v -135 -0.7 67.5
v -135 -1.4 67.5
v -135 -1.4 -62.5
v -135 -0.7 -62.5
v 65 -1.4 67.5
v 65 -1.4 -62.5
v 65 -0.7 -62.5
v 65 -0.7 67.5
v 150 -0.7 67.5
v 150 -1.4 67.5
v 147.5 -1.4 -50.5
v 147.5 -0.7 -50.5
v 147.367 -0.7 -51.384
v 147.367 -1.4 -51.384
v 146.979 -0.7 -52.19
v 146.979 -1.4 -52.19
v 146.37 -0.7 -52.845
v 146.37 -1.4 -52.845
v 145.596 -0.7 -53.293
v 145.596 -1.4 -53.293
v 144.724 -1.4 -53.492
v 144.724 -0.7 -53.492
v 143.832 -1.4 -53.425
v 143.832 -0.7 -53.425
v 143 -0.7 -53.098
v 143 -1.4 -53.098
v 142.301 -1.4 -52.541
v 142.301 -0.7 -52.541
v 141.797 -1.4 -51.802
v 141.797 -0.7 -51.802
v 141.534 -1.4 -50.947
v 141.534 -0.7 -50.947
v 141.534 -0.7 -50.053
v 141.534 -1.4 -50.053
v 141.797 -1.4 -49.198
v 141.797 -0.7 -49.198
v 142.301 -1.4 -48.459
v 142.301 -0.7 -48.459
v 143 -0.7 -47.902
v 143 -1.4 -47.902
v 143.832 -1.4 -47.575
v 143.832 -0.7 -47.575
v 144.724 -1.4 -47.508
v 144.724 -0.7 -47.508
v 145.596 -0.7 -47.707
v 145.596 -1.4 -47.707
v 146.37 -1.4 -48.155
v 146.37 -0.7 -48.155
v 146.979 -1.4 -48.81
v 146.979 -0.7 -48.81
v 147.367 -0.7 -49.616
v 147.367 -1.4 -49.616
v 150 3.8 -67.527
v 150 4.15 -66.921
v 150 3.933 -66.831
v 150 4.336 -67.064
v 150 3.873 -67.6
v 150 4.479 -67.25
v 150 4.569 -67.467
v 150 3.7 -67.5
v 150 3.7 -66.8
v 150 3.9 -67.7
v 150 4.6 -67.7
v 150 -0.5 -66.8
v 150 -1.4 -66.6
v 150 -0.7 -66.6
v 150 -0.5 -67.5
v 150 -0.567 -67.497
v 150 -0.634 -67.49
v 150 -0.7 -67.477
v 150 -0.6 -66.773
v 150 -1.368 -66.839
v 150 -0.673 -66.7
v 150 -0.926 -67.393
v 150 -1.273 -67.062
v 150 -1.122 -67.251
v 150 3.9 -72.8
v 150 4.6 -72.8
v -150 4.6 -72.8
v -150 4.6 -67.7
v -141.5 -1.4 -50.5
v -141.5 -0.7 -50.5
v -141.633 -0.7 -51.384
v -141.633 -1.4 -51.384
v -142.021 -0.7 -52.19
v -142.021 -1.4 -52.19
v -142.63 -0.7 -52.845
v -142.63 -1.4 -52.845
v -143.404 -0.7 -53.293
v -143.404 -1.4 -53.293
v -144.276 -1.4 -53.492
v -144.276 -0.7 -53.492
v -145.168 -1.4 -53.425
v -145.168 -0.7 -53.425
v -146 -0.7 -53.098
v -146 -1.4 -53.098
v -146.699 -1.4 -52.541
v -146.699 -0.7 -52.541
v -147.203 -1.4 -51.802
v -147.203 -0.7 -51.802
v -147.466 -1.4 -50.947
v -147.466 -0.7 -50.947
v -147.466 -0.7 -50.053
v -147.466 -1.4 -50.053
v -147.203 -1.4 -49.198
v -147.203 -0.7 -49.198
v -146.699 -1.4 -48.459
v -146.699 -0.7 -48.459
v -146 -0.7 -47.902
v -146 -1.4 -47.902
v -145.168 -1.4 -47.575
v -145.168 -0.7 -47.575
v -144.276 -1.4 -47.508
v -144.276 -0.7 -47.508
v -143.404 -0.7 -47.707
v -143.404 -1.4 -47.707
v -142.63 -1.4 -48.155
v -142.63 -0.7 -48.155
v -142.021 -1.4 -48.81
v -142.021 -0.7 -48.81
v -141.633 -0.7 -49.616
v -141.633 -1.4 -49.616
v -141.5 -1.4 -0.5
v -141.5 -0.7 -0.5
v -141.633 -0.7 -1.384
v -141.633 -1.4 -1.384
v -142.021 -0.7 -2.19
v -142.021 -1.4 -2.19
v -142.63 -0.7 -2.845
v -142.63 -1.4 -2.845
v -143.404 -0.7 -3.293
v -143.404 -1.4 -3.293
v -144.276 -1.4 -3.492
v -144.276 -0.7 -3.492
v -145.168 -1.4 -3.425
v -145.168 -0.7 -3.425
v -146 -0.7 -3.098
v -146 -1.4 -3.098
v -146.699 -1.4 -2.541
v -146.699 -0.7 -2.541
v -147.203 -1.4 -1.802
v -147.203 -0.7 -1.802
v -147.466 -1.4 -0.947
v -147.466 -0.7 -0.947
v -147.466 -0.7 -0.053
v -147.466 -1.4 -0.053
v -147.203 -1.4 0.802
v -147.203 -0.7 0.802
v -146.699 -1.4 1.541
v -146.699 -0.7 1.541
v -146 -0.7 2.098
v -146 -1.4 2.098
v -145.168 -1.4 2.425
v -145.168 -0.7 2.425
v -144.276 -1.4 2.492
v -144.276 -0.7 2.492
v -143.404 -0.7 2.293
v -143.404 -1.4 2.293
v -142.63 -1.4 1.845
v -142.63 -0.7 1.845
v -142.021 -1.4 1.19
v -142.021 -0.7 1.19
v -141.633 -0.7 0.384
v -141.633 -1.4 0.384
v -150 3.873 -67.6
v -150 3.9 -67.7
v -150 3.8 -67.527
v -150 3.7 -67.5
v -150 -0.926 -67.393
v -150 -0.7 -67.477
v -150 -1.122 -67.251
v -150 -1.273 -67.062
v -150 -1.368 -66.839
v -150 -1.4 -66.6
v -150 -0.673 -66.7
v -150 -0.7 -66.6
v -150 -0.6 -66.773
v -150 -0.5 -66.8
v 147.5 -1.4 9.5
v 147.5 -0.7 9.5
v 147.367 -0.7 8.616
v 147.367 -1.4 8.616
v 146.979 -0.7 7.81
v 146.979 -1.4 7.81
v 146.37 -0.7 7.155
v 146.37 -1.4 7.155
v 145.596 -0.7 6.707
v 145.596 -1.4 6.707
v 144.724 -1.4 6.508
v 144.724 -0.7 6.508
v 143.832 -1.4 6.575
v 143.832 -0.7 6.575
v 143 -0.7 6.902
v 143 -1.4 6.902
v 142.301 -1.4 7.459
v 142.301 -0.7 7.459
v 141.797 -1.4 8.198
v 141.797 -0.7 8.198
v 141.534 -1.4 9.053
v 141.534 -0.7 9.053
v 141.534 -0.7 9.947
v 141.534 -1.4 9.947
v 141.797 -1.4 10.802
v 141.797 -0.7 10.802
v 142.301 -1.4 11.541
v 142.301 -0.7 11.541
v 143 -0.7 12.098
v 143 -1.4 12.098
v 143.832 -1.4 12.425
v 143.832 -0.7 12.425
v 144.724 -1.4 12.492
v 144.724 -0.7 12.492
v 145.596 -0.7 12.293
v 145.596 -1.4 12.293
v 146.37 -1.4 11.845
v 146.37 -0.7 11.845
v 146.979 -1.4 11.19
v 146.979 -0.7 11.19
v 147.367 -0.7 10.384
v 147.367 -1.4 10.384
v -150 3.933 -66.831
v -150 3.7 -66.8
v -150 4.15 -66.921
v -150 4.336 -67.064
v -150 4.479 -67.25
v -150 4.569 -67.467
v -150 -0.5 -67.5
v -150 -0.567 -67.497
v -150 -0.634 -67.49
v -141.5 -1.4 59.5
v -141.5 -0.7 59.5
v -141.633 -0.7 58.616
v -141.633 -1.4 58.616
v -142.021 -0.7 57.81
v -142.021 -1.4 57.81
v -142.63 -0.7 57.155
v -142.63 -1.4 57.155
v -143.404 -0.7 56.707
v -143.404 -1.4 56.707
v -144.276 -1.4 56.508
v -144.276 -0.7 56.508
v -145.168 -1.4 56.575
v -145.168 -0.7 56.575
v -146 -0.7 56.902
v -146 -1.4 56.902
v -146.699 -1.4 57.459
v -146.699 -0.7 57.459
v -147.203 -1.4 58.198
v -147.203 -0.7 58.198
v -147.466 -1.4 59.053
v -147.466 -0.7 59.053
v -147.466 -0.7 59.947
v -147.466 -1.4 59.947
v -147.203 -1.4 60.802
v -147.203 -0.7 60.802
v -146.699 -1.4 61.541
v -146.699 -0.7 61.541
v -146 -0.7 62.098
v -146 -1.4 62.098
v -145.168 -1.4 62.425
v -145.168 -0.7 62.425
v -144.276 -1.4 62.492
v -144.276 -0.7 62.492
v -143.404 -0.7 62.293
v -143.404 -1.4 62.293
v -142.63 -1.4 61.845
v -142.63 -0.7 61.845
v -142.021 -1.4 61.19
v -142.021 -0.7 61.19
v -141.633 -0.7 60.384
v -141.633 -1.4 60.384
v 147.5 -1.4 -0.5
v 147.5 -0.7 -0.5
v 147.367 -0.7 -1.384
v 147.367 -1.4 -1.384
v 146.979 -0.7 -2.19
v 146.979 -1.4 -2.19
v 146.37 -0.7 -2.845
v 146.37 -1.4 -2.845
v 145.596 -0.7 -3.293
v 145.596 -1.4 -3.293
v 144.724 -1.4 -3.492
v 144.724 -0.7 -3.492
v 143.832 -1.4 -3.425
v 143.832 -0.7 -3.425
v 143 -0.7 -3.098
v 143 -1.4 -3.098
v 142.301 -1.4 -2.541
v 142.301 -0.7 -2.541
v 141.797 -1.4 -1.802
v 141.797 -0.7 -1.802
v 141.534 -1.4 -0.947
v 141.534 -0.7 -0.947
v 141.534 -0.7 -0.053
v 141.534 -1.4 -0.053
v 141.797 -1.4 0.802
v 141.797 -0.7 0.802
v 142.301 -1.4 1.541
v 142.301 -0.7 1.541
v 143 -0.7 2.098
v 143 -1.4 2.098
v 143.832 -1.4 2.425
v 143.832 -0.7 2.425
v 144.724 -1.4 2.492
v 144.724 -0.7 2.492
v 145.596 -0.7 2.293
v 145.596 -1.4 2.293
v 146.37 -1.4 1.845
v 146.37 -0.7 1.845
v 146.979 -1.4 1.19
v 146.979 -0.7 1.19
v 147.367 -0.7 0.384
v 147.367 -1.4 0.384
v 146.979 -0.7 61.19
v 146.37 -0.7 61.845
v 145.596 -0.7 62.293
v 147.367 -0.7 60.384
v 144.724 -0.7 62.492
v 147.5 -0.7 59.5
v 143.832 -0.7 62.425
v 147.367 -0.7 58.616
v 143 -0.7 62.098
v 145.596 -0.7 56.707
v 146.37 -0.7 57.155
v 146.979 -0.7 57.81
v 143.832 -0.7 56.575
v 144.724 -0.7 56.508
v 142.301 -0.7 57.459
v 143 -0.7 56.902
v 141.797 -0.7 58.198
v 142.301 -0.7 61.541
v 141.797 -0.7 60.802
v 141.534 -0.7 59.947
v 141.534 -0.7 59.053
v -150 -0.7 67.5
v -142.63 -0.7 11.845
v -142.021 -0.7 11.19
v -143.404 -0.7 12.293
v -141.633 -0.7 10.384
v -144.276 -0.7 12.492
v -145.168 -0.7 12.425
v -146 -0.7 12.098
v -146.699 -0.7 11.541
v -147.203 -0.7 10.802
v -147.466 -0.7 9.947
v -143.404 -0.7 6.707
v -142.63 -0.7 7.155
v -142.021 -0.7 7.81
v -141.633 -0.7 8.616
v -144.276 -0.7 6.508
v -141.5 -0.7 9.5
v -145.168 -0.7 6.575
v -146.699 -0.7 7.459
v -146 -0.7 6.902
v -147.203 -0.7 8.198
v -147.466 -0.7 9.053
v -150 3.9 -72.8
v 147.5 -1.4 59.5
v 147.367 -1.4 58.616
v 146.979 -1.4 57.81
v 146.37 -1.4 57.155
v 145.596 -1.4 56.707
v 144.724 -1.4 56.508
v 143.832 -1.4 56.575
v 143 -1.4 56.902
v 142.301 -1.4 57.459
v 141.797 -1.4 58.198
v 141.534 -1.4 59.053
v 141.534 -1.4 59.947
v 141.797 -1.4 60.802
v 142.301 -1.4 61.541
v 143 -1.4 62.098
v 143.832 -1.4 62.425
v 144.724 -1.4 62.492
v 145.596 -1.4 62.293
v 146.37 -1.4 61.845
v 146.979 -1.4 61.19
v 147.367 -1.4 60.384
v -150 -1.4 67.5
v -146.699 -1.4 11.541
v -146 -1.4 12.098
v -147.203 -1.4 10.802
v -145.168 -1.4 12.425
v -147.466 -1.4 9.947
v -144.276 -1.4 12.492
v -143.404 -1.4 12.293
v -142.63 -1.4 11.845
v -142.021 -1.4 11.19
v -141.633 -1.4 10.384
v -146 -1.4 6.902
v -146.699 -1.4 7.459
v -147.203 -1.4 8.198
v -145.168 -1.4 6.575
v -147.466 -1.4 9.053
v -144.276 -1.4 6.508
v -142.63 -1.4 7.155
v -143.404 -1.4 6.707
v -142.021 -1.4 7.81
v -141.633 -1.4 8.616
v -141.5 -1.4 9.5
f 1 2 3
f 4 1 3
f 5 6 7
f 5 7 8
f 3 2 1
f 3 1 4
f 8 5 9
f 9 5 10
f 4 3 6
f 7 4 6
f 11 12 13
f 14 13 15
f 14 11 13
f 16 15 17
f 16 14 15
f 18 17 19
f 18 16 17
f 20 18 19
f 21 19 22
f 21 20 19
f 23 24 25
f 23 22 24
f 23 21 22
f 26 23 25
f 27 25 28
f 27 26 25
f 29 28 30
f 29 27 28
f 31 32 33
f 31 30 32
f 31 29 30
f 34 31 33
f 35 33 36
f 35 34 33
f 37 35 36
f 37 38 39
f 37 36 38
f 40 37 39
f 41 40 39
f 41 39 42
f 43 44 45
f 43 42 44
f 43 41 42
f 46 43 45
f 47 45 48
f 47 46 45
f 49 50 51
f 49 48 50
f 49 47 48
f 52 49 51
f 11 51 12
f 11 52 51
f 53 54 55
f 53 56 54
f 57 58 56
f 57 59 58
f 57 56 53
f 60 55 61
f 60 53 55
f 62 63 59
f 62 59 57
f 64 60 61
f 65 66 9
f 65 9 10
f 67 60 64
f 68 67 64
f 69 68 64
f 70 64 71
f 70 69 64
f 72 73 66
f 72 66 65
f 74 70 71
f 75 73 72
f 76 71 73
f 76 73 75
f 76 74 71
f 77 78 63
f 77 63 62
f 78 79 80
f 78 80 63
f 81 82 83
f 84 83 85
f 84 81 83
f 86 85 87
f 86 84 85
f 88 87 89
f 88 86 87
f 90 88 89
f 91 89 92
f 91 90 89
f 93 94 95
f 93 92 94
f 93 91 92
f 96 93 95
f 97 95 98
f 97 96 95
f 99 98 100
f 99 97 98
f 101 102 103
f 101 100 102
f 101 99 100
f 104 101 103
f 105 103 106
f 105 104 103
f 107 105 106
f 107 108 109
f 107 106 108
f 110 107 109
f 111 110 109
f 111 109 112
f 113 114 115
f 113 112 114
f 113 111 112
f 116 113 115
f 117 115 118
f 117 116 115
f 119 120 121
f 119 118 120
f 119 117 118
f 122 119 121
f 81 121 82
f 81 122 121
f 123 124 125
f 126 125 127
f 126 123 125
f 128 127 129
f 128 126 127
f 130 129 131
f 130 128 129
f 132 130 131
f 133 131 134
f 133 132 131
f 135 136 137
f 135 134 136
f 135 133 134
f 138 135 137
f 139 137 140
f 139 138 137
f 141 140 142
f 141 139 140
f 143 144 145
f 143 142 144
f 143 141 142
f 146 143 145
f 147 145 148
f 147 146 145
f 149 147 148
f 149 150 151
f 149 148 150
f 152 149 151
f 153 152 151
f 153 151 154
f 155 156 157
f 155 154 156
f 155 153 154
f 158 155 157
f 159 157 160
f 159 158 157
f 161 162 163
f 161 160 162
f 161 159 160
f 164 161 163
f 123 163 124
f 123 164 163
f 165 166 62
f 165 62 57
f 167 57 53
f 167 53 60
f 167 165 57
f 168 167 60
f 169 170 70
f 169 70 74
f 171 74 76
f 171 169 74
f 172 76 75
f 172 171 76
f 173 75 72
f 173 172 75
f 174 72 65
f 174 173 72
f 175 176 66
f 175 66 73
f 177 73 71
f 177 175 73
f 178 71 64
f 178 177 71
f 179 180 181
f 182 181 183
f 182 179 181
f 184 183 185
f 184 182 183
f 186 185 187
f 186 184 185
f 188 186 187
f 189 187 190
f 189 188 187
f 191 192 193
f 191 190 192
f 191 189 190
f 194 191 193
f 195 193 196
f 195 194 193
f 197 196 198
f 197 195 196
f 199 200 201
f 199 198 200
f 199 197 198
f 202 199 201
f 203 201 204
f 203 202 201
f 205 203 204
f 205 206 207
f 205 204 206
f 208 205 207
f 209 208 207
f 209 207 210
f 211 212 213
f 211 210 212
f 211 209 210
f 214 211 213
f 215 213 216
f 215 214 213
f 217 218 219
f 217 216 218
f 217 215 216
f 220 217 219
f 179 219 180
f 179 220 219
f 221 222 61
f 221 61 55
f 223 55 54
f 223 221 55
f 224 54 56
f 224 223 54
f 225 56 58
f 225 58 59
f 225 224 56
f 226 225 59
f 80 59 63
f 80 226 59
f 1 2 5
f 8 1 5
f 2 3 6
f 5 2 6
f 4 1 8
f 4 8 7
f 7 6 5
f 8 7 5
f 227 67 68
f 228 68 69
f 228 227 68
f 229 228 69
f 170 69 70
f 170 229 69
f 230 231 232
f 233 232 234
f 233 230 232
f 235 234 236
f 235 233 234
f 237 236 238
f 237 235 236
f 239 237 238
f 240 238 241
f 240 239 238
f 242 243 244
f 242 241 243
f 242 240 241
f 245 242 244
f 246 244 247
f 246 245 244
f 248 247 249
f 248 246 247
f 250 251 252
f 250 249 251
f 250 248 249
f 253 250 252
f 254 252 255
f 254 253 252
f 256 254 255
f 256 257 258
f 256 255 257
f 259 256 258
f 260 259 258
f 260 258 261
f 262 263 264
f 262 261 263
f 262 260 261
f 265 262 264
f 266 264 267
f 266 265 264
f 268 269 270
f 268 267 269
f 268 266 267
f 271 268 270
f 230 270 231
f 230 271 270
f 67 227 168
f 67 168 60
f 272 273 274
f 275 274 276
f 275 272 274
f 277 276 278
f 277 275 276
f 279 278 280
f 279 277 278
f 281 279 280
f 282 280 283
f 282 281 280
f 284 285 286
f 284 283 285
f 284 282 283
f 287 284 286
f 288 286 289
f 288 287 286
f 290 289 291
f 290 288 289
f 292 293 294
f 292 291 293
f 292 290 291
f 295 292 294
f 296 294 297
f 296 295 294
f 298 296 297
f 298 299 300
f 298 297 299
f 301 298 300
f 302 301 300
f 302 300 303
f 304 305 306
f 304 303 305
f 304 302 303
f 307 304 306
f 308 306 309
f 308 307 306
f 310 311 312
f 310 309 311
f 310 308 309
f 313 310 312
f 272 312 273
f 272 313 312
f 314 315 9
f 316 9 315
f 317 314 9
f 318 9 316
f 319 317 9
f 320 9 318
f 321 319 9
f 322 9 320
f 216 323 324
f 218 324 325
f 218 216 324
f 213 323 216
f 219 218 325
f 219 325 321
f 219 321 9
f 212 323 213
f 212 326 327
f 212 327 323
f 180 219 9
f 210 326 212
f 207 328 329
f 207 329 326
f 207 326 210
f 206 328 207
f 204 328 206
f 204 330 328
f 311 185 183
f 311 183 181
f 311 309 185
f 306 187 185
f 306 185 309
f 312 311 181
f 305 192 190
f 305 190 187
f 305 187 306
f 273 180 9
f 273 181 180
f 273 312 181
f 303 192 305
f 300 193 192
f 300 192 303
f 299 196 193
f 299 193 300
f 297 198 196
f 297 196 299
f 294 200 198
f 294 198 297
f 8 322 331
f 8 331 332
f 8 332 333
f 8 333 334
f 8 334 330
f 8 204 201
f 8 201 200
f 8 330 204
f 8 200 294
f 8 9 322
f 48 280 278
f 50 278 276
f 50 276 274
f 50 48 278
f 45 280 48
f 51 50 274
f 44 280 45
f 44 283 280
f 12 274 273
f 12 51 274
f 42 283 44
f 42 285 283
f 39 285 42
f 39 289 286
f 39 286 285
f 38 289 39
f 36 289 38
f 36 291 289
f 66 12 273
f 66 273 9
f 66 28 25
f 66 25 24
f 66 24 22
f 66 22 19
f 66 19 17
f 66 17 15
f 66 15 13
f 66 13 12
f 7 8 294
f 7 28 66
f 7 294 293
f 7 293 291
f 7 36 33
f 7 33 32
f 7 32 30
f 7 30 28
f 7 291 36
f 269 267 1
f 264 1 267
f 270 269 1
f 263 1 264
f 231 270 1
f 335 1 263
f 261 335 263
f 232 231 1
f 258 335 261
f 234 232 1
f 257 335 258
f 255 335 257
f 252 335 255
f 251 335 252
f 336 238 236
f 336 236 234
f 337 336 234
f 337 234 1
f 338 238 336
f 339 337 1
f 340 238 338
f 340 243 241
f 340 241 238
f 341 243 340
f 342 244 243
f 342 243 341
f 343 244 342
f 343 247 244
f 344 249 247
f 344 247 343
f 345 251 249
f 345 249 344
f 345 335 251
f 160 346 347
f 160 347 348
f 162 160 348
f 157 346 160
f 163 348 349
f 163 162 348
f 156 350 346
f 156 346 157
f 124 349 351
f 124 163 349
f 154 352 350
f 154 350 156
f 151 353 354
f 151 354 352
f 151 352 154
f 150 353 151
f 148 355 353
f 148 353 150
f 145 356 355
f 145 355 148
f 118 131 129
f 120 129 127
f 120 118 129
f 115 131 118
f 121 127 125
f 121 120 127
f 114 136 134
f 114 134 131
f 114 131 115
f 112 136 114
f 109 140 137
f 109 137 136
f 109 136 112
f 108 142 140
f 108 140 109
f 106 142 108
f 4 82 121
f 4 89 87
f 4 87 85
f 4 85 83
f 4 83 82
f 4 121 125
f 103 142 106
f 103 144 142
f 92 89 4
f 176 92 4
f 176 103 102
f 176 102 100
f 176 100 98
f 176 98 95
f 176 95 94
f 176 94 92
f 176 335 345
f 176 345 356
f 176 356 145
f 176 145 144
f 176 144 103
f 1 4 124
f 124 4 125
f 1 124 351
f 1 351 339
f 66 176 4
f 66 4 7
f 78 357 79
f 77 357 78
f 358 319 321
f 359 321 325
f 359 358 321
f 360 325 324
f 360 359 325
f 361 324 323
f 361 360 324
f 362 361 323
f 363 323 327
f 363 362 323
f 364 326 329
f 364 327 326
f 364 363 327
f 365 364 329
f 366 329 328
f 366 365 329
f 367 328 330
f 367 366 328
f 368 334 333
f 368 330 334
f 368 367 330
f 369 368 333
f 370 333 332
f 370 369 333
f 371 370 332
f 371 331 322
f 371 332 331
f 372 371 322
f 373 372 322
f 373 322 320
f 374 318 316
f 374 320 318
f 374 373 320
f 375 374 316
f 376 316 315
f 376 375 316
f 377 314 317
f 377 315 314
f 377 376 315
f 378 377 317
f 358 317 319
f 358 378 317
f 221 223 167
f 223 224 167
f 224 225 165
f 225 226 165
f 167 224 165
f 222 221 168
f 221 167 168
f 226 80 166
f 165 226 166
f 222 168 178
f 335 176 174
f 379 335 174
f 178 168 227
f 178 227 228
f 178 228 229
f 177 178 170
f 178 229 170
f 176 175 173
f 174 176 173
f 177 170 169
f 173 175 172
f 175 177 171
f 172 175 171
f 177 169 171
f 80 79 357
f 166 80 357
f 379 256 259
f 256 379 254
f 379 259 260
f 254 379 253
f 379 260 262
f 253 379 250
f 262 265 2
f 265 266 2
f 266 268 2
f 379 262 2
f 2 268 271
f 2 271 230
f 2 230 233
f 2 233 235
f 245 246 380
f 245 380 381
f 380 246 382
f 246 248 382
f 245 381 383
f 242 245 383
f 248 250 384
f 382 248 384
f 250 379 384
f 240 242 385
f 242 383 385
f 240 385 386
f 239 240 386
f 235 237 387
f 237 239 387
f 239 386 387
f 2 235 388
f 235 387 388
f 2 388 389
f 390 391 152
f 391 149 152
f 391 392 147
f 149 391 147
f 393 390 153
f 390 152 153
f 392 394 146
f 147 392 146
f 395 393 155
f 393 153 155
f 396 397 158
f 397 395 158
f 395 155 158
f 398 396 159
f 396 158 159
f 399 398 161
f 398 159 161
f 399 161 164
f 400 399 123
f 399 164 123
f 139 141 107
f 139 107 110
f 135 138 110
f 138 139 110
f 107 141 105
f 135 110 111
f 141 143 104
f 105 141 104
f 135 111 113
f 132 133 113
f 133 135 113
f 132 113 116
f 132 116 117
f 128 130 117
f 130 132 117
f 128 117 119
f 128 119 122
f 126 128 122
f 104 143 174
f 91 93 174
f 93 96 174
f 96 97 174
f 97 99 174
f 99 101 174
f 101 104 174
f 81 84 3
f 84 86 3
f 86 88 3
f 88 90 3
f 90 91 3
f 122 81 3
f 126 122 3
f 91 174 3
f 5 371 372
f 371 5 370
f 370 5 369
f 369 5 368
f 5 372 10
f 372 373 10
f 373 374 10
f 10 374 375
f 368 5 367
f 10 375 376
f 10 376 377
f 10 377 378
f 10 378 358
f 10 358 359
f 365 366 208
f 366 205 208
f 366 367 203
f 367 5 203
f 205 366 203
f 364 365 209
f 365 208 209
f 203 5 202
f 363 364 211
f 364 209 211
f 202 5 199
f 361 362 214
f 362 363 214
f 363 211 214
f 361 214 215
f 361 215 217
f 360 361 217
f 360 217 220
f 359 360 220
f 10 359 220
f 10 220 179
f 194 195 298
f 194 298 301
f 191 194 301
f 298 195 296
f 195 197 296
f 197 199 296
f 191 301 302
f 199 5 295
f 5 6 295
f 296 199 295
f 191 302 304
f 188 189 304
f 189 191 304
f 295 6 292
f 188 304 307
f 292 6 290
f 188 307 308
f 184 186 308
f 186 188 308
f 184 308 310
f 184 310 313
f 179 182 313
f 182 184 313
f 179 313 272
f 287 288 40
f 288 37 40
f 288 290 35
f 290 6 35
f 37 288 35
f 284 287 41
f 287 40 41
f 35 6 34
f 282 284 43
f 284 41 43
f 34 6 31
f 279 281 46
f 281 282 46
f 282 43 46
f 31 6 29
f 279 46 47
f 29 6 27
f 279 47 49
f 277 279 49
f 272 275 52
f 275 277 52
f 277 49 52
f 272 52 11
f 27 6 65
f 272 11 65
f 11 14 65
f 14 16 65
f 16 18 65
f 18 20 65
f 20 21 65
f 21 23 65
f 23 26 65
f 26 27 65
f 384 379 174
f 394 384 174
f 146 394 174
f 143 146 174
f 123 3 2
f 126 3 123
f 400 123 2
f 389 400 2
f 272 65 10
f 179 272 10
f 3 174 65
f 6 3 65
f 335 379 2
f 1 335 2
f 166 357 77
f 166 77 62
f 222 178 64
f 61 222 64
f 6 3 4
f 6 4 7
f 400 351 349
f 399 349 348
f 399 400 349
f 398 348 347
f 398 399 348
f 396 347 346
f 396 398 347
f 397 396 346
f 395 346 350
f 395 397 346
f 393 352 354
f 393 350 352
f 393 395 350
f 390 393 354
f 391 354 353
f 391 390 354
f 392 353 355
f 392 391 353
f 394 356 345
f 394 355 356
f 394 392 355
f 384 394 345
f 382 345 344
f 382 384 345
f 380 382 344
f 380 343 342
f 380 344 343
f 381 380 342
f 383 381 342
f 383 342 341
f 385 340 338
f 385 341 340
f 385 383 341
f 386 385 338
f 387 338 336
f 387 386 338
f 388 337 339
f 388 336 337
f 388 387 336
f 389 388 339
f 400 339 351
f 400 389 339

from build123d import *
from build123d.topology import SkipClean

# Parameters (mm, degrees)
SKETCH_1_W                       = 300
SKETCH_1_H                       = 135
SKETCH_1_R                       = 3
SM_BASE_FLANGE_1_DEPTH           = 0.7
SM_EDGE_FLANGE_1_STRIP_W         = 3.2
SM_EDGE_FLANGE_1_STRIP_H         = 0.7
SM_EDGE_FLANGE_1_STRIP_CUT_DEPTH = 300
SM_EDGE_FLANGE_1_DEPTH           = 300
SM_EDGE_FLANGE_2_STRIP_W         = 3.2
SM_EDGE_FLANGE_2_STRIP_H         = 0.7
SM_EDGE_FLANGE_2_STRIP_CUT_DEPTH = 300
SM_EDGE_FLANGE_2_DEPTH           = 300
MOVE_START                       = -0.5
MOVE_BODY_1_OUTLINE_W            = 300
MOVE_BODY_1_OUTLINE_H            = 134.3
MOVE_BODY_1_OUTLINE_R            = 3
MOVE_BODY_1_DEPTH                = 0.5
MOVE_START_2                     = -6
MOVE_BODY_1_2_OUTLINE_W          = 300
MOVE_BODY_1_2_OUTLINE_H          = 6
MOVE_BODY_1_2_DEPTH              = 4.6
MOVE_START_3                     = -1.343604
MOVE_BODY_1_3_OUTLINE_W          = 300
MOVE_BODY_1_3_OUTLINE_H          = 134.3
MOVE_BODY_1_3_OUTLINE_R          = 3
MOVE_BODY_1_3_DEPTH              = 0.643604
MOVE_BODY_1_4_OUTLINE_W          = 300
MOVE_BODY_1_4_OUTLINE_H          = 0.7
MOVE_BODY_1_4_DEPTH              = 4.2
MOVE_START_4                     = -1.4
MOVE_BODY_1_5_OUTLINE_W          = 300
MOVE_BODY_1_5_OUTLINE_H          = 134.3
MOVE_BODY_1_5_OUTLINE_R          = 3
MOVE_BODY_1_5_DEPTH              = 0.056396
MOVE_START_5                     = 3.7
MOVE_BODY_1_6_OUTLINE_W          = 300
MOVE_BODY_1_6_OUTLINE_H          = 6
MOVE_BODY_1_6_DEPTH              = 0.9
MOVE_START_6                     = -0.7
MOVE_BODY_1_7_OUTLINE_W          = 300
MOVE_BODY_1_7_OUTLINE_H          = 0.7
MOVE_BODY_1_7_DEPTH              = 0.2
MOVE_START_7                     = -151
MOVE_BODY_1_8_DEPTH              = 301
SPLIT_BODIES_1_SURFACE_1_BACK    = 332.24
SPLIT_BODIES_1_SURFACE_1_DEPTH   = 664.48
SPLIT_BODIES_1_SURFACE_2_BACK    = 332.24
SPLIT_BODIES_1_SURFACE_2_DEPTH   = 664.48


with BuildPart() as part:
    # 基体-法兰1: sheet metal written as solids
    # 草图1 → 基体-法兰1 (new body)
    with BuildSketch(Plane(origin=(0, 0, 0), x_dir=(1, 0, 0), z_dir=(0, 1, 0))):
        Rectangle(SKETCH_1_W, SKETCH_1_H)
        with Locations(Location((-144.5, -59.5, 0), (0, 0, 270))):
            Circle(SKETCH_1_R, mode=Mode.SUBTRACT)
        with Locations(Location((-144.5, -9.5, 0), (0, 0, 270))):
            Circle(SKETCH_1_R, mode=Mode.SUBTRACT)
        with Locations(Location((-144.5, 0.5, 0), (0, 0, 270))):
            Circle(SKETCH_1_R, mode=Mode.SUBTRACT)
        with Locations(Location((-144.5, 50.5, 0), (0, 0, 270))):
            Circle(SKETCH_1_R, mode=Mode.SUBTRACT)
        with Locations(Location((144.5, -59.5, 0), (0, 0, 90))):
            Circle(SKETCH_1_R, mode=Mode.SUBTRACT)
        with Locations(Location((144.5, -9.5, 0), (0, 0, 90))):
            Circle(SKETCH_1_R, mode=Mode.SUBTRACT)
        with Locations(Location((144.5, 0.5, 0), (0, 0, 90))):
            Circle(SKETCH_1_R, mode=Mode.SUBTRACT)
        with Locations(Location((144.5, 50.5, 0), (0, 0, 90))):
            Circle(SKETCH_1_R, mode=Mode.SUBTRACT)
    extrude(amount=-SM_BASE_FLANGE_1_DEPTH)

    # 边线-法兰1: sheet metal written as solids
    # 边线-法兰1 strip (on a plane across the edge) → 边线-法兰1 strip cut (cut)
    with BuildSketch(Plane(origin=(-150, -0.7, -67.5), x_dir=(0, 0, 1), z_dir=(1, 0, 0))):
        with Locations((-0.7, -0.35)):
            Rectangle(SM_EDGE_FLANGE_1_STRIP_W, SM_EDGE_FLANGE_1_STRIP_H)
    extrude(amount=SM_EDGE_FLANGE_1_STRIP_CUT_DEPTH, mode=Mode.SUBTRACT)

    # 边线-法兰1 section (on a plane across the edge) → 边线-法兰1 (add)
    with BuildSketch(Plane(origin=(-150, -0.7, -67.5), x_dir=(0, 0, 1), z_dir=(1, 0, 0))):
        with BuildLine():
            Line((0, 0.2), (0, 5.3))
            Line((0, 5.3), (0.7, 5.3))
            Line((0.7, 5.3), (0.7, 0.2))
            ThreePointArc((0.7, 0.2), (0.758578644, 0.058578644), (0.9, 0))
            Line((0.9, 0), (0.9, -0.7))
            ThreePointArc((0.9, -0.7), (0.263603897, -0.436396103), (0, 0.2))
        make_face()
    extrude(amount=SM_EDGE_FLANGE_1_DEPTH)

    # 边线-法兰2: sheet metal written as solids
    # 边线-法兰2 strip (on a plane across the edge) → 边线-法兰2 strip cut (cut)
    with BuildSketch(Plane(origin=(150, -6, -67.5), x_dir=(0, 1, 0), z_dir=(-1, 0, 0))):
        with Locations((-0.7, -0.35)):
            Rectangle(SM_EDGE_FLANGE_2_STRIP_W, SM_EDGE_FLANGE_2_STRIP_H)
    extrude(amount=SM_EDGE_FLANGE_2_STRIP_CUT_DEPTH, mode=Mode.SUBTRACT)

    # 边线-法兰2 section (on a plane across the edge) → 边线-法兰2 (add)
    with BuildSketch(Plane(origin=(150, -6, -67.5), x_dir=(0, 1, 0), z_dir=(-1, 0, 0))):
        with BuildLine():
            Line((0, 0.2), (0, 5.3))
            Line((0, 5.3), (0.7, 5.3))
            Line((0.7, 5.3), (0.7, 0.2))
            ThreePointArc((0.7, 0.2), (0.758578644, 0.058578644), (0.9, 0))
            Line((0.9, 0), (0.9, -0.7))
            ThreePointArc((0.9, -0.7), (0.263603897, -0.436396103), (0, 0.2))
        make_face()
    extrude(amount=SM_EDGE_FLANGE_2_DEPTH)

    # Move Body 1: read off the stored shape, not the designer's step
    # Move Body 1 outline → Move Body 1 (cut)
    with BuildSketch(Plane(origin=(0, 0, 0), x_dir=(1, 0, 0), z_dir=(0, 1, 0)).offset(MOVE_START)):
        with Locations((0, -0.35)):
            Rectangle(MOVE_BODY_1_OUTLINE_W, MOVE_BODY_1_OUTLINE_H)
        with Locations((-144.5, -59.5)):
            Circle(MOVE_BODY_1_OUTLINE_R, mode=Mode.SUBTRACT)
        with Locations((-144.5, -9.5)):
            Circle(MOVE_BODY_1_OUTLINE_R, mode=Mode.SUBTRACT)
        with Locations((-144.5, 0.5)):
            Circle(MOVE_BODY_1_OUTLINE_R, mode=Mode.SUBTRACT)
        with Locations((144.5, -59.5)):
            Circle(MOVE_BODY_1_OUTLINE_R, mode=Mode.SUBTRACT)
        with Locations((144.5, -9.5)):
            Circle(MOVE_BODY_1_OUTLINE_R, mode=Mode.SUBTRACT)
        with Locations((144.5, 0.5)):
            Circle(MOVE_BODY_1_OUTLINE_R, mode=Mode.SUBTRACT)
        with Locations((-144.5, 50.5)):
            Circle(MOVE_BODY_1_OUTLINE_R, mode=Mode.SUBTRACT)
        with Locations((144.5, 50.5)):
            Circle(MOVE_BODY_1_OUTLINE_R, mode=Mode.SUBTRACT)
    extrude(amount=MOVE_BODY_1_DEPTH, mode=Mode.SUBTRACT)

    # Move Body 1 2 outline → Move Body 1 2 (cut)
    with BuildSketch(Plane(origin=(0, 0, 0), x_dir=(1, 0, 0), z_dir=(0, 1, 0)).offset(MOVE_START_2)):
        with Locations((0, 69.8)):
            Rectangle(MOVE_BODY_1_2_OUTLINE_W, MOVE_BODY_1_2_OUTLINE_H)
    extrude(amount=MOVE_BODY_1_2_DEPTH, mode=Mode.SUBTRACT)

    # Move Body 1 3 outline → Move Body 1 3 (add)
    with SkipClean():  # the faces are left unmerged after this step: merging them gives an invalid solid
        with BuildSketch(Plane(origin=(0, 0, 0), x_dir=(1, 0, 0), z_dir=(0, 1, 0)).offset(MOVE_START_3)):
            with Locations((0, -0.35)):
                Rectangle(MOVE_BODY_1_3_OUTLINE_W, MOVE_BODY_1_3_OUTLINE_H)
            with Locations((-144.5, -59.5)):
                Circle(MOVE_BODY_1_3_OUTLINE_R, mode=Mode.SUBTRACT)
            with Locations((-144.5, -9.5)):
                Circle(MOVE_BODY_1_3_OUTLINE_R, mode=Mode.SUBTRACT)
            with Locations((-144.5, 0.5)):
                Circle(MOVE_BODY_1_3_OUTLINE_R, mode=Mode.SUBTRACT)
            with Locations((144.5, -59.5)):
                Circle(MOVE_BODY_1_3_OUTLINE_R, mode=Mode.SUBTRACT)
            with Locations((144.5, -9.5)):
                Circle(MOVE_BODY_1_3_OUTLINE_R, mode=Mode.SUBTRACT)
            with Locations((144.5, 0.5)):
                Circle(MOVE_BODY_1_3_OUTLINE_R, mode=Mode.SUBTRACT)
            with Locations((-144.5, 50.5)):
                Circle(MOVE_BODY_1_3_OUTLINE_R, mode=Mode.SUBTRACT)
            with Locations((144.5, 50.5)):
                Circle(MOVE_BODY_1_3_OUTLINE_R, mode=Mode.SUBTRACT)
        extrude(amount=MOVE_BODY_1_3_DEPTH)

    # Move Body 1 4 outline → Move Body 1 4 (add)
    with SkipClean():  # the faces are left unmerged after this step: merging them gives an invalid solid
        with BuildSketch(Plane(origin=(0, 0, 0), x_dir=(1, 0, 0), z_dir=(0, 1, 0)).offset(MOVE_START)):
            with Locations((0, 67.15)):
                Rectangle(MOVE_BODY_1_4_OUTLINE_W, MOVE_BODY_1_4_OUTLINE_H)
        extrude(amount=MOVE_BODY_1_4_DEPTH)

    # Move Body 1 5 outline → Move Body 1 5 (add)
    with SkipClean():  # the faces are left unmerged after this step: merging them gives an invalid solid
        with BuildSketch(Plane(origin=(0, 0, 0), x_dir=(1, 0, 0), z_dir=(0, 1, 0)).offset(MOVE_START_4)):
            with Locations((0, -0.35)):
                Rectangle(MOVE_BODY_1_5_OUTLINE_W, MOVE_BODY_1_5_OUTLINE_H)
            with Locations((-144.5, -59.5)):
                Circle(MOVE_BODY_1_5_OUTLINE_R, mode=Mode.SUBTRACT)
            with Locations((-144.5, -9.5)):
                Circle(MOVE_BODY_1_5_OUTLINE_R, mode=Mode.SUBTRACT)
            with Locations((-144.5, 0.5)):
                Circle(MOVE_BODY_1_5_OUTLINE_R, mode=Mode.SUBTRACT)
            with Locations((144.5, -59.5)):
                Circle(MOVE_BODY_1_5_OUTLINE_R, mode=Mode.SUBTRACT)
            with Locations((144.5, -9.5)):
                Circle(MOVE_BODY_1_5_OUTLINE_R, mode=Mode.SUBTRACT)
            with Locations((144.5, 0.5)):
                Circle(MOVE_BODY_1_5_OUTLINE_R, mode=Mode.SUBTRACT)
            with Locations((-144.5, 50.5)):
                Circle(MOVE_BODY_1_5_OUTLINE_R, mode=Mode.SUBTRACT)
            with Locations((144.5, 50.5)):
                Circle(MOVE_BODY_1_5_OUTLINE_R, mode=Mode.SUBTRACT)
        extrude(amount=MOVE_BODY_1_5_DEPTH)

    # Move Body 1 6 outline → Move Body 1 6 (add)
    with SkipClean():  # the faces are left unmerged after this step: merging them gives an invalid solid
        with BuildSketch(Plane(origin=(0, 0, 0), x_dir=(1, 0, 0), z_dir=(0, 1, 0)).offset(MOVE_START_5)):
            with Locations((0, 69.8)):
                Rectangle(MOVE_BODY_1_6_OUTLINE_W, MOVE_BODY_1_6_OUTLINE_H)
        extrude(amount=MOVE_BODY_1_6_DEPTH)

    # Move Body 1 7 outline → Move Body 1 7 (add)
    with SkipClean():  # the faces are left unmerged after this step: merging them gives an invalid solid
        with BuildSketch(Plane(origin=(0, 0, 0), x_dir=(1, 0, 0), z_dir=(0, 1, 0)).offset(MOVE_START_6)):
            with Locations((0, 67.15)):
                Rectangle(MOVE_BODY_1_7_OUTLINE_W, MOVE_BODY_1_7_OUTLINE_H)
        extrude(amount=MOVE_BODY_1_7_DEPTH)

    # Move Body 1 8 outline → Move Body 1 8 (cut)
    with BuildSketch(Plane.YZ.offset(MOVE_START_7)):
        with BuildLine():
            Line((-0.5, 67.5), (-0.7, 67.5))
            Line((-0.7, 67.5), (-0.7, -66.6))
            ThreePointArc((-0.7, -66.6), (-0.641421356, -66.741421356), (-0.5, -66.8))
            Line((-0.5, -66.8), (-0.5, 67.5))
        make_face()
        with BuildLine():
            ThreePointArc((-0.7, -67.477496439), (-1.203562364, -67.161248608), (-1.4, -66.6))
            Line((-1.4, -66.6), (-1.4, -67.5))
            Line((-1.4, -67.5), (-0.9, -67.5))
            ThreePointArc((-0.9, -67.5), (-0.799368978, -67.494356415), (-0.7, -67.477496439))
        make_face()
        with BuildLine():
            Line((4.6, -66.8), (3.7, -66.8))
            ThreePointArc((3.7, -66.8), (4.336396103, -67.063603897), (4.6, -67.7))
            Line((4.6, -67.7), (4.6, -66.8))
        make_face()
        with BuildLine():
            ThreePointArc((-0.5, -67.5), (-0.600631022, -67.494356415), (-0.7, -67.477496439))
            Line((-0.7, -67.477496439), (-0.7, -67.5))
            Line((-0.7, -67.5), (-0.5, -67.5))
        make_face()
        with BuildLine():
            ThreePointArc((3.9, -67.7), (3.841421356, -67.558578644), (3.7, -67.5))
            Line((3.7, -67.5), (3.7, -72.8))
            Line((3.7, -72.8), (3.9, -72.8))
            Line((3.9, -72.8), (3.9, -67.7))
        make_face()
    extrude(amount=MOVE_BODY_1_8_DEPTH, mode=Mode.SUBTRACT)


with BuildPart() as body_2:
    # Split Bodies 1: the piece behind the surface
    add(part.part)
    # Split Bodies 1 surface: a surface, the sketch's curves swept straight by 664.48 mm
    with BuildLine(Plane(origin=(0, -0.7, 0), x_dir=(1, 0, 0), z_dir=(0, 1, 0)).offset(-SPLIT_BODIES_1_SURFACE_1_BACK), mode=Mode.PRIVATE) as split_bodies_1_surface_1_path:
        Line((65, -67.5), (-135, -67.5))
        Line((-135, -67.5), (-135, 62.5))
        Line((-135, 62.5), (65, 62.5))
        Line((65, 62.5), (65, -67.5))
    split_bodies_1_surface_1 = Shell.extrude(split_bodies_1_surface_1_path.wire(), (0 * SPLIT_BODIES_1_SURFACE_1_DEPTH, 1 * SPLIT_BODIES_1_SURFACE_1_DEPTH, 0 * SPLIT_BODIES_1_SURFACE_1_DEPTH))
    split(bisect_by=split_bodies_1_surface_1, keep=Keep.BOTTOM)


with BuildPart() as part_1:
    add(part.part)

    # Split Bodies 1: split by a surface, the side it looks to stays
    # Split Bodies 1 surface: a surface, the sketch's curves swept straight by 664.48 mm
    with BuildLine(Plane(origin=(0, -0.7, 0), x_dir=(1, 0, 0), z_dir=(0, 1, 0)).offset(-SPLIT_BODIES_1_SURFACE_2_BACK), mode=Mode.PRIVATE) as split_bodies_1_surface_2_path:
        Line((65, -67.5), (-135, -67.5))
        Line((-135, -67.5), (-135, 62.5))
        Line((-135, 62.5), (65, 62.5))
        Line((65, 62.5), (65, -67.5))
    split_bodies_1_surface_2 = Shell.extrude(split_bodies_1_surface_2_path.wire(), (0 * SPLIT_BODIES_1_SURFACE_2_DEPTH, 1 * SPLIT_BODIES_1_SURFACE_2_DEPTH, 0 * SPLIT_BODIES_1_SURFACE_2_DEPTH))
    split(bisect_by=split_bodies_1_surface_2, keep=Keep.TOP)


solid = Compound([body_2.part, part_1.part])
